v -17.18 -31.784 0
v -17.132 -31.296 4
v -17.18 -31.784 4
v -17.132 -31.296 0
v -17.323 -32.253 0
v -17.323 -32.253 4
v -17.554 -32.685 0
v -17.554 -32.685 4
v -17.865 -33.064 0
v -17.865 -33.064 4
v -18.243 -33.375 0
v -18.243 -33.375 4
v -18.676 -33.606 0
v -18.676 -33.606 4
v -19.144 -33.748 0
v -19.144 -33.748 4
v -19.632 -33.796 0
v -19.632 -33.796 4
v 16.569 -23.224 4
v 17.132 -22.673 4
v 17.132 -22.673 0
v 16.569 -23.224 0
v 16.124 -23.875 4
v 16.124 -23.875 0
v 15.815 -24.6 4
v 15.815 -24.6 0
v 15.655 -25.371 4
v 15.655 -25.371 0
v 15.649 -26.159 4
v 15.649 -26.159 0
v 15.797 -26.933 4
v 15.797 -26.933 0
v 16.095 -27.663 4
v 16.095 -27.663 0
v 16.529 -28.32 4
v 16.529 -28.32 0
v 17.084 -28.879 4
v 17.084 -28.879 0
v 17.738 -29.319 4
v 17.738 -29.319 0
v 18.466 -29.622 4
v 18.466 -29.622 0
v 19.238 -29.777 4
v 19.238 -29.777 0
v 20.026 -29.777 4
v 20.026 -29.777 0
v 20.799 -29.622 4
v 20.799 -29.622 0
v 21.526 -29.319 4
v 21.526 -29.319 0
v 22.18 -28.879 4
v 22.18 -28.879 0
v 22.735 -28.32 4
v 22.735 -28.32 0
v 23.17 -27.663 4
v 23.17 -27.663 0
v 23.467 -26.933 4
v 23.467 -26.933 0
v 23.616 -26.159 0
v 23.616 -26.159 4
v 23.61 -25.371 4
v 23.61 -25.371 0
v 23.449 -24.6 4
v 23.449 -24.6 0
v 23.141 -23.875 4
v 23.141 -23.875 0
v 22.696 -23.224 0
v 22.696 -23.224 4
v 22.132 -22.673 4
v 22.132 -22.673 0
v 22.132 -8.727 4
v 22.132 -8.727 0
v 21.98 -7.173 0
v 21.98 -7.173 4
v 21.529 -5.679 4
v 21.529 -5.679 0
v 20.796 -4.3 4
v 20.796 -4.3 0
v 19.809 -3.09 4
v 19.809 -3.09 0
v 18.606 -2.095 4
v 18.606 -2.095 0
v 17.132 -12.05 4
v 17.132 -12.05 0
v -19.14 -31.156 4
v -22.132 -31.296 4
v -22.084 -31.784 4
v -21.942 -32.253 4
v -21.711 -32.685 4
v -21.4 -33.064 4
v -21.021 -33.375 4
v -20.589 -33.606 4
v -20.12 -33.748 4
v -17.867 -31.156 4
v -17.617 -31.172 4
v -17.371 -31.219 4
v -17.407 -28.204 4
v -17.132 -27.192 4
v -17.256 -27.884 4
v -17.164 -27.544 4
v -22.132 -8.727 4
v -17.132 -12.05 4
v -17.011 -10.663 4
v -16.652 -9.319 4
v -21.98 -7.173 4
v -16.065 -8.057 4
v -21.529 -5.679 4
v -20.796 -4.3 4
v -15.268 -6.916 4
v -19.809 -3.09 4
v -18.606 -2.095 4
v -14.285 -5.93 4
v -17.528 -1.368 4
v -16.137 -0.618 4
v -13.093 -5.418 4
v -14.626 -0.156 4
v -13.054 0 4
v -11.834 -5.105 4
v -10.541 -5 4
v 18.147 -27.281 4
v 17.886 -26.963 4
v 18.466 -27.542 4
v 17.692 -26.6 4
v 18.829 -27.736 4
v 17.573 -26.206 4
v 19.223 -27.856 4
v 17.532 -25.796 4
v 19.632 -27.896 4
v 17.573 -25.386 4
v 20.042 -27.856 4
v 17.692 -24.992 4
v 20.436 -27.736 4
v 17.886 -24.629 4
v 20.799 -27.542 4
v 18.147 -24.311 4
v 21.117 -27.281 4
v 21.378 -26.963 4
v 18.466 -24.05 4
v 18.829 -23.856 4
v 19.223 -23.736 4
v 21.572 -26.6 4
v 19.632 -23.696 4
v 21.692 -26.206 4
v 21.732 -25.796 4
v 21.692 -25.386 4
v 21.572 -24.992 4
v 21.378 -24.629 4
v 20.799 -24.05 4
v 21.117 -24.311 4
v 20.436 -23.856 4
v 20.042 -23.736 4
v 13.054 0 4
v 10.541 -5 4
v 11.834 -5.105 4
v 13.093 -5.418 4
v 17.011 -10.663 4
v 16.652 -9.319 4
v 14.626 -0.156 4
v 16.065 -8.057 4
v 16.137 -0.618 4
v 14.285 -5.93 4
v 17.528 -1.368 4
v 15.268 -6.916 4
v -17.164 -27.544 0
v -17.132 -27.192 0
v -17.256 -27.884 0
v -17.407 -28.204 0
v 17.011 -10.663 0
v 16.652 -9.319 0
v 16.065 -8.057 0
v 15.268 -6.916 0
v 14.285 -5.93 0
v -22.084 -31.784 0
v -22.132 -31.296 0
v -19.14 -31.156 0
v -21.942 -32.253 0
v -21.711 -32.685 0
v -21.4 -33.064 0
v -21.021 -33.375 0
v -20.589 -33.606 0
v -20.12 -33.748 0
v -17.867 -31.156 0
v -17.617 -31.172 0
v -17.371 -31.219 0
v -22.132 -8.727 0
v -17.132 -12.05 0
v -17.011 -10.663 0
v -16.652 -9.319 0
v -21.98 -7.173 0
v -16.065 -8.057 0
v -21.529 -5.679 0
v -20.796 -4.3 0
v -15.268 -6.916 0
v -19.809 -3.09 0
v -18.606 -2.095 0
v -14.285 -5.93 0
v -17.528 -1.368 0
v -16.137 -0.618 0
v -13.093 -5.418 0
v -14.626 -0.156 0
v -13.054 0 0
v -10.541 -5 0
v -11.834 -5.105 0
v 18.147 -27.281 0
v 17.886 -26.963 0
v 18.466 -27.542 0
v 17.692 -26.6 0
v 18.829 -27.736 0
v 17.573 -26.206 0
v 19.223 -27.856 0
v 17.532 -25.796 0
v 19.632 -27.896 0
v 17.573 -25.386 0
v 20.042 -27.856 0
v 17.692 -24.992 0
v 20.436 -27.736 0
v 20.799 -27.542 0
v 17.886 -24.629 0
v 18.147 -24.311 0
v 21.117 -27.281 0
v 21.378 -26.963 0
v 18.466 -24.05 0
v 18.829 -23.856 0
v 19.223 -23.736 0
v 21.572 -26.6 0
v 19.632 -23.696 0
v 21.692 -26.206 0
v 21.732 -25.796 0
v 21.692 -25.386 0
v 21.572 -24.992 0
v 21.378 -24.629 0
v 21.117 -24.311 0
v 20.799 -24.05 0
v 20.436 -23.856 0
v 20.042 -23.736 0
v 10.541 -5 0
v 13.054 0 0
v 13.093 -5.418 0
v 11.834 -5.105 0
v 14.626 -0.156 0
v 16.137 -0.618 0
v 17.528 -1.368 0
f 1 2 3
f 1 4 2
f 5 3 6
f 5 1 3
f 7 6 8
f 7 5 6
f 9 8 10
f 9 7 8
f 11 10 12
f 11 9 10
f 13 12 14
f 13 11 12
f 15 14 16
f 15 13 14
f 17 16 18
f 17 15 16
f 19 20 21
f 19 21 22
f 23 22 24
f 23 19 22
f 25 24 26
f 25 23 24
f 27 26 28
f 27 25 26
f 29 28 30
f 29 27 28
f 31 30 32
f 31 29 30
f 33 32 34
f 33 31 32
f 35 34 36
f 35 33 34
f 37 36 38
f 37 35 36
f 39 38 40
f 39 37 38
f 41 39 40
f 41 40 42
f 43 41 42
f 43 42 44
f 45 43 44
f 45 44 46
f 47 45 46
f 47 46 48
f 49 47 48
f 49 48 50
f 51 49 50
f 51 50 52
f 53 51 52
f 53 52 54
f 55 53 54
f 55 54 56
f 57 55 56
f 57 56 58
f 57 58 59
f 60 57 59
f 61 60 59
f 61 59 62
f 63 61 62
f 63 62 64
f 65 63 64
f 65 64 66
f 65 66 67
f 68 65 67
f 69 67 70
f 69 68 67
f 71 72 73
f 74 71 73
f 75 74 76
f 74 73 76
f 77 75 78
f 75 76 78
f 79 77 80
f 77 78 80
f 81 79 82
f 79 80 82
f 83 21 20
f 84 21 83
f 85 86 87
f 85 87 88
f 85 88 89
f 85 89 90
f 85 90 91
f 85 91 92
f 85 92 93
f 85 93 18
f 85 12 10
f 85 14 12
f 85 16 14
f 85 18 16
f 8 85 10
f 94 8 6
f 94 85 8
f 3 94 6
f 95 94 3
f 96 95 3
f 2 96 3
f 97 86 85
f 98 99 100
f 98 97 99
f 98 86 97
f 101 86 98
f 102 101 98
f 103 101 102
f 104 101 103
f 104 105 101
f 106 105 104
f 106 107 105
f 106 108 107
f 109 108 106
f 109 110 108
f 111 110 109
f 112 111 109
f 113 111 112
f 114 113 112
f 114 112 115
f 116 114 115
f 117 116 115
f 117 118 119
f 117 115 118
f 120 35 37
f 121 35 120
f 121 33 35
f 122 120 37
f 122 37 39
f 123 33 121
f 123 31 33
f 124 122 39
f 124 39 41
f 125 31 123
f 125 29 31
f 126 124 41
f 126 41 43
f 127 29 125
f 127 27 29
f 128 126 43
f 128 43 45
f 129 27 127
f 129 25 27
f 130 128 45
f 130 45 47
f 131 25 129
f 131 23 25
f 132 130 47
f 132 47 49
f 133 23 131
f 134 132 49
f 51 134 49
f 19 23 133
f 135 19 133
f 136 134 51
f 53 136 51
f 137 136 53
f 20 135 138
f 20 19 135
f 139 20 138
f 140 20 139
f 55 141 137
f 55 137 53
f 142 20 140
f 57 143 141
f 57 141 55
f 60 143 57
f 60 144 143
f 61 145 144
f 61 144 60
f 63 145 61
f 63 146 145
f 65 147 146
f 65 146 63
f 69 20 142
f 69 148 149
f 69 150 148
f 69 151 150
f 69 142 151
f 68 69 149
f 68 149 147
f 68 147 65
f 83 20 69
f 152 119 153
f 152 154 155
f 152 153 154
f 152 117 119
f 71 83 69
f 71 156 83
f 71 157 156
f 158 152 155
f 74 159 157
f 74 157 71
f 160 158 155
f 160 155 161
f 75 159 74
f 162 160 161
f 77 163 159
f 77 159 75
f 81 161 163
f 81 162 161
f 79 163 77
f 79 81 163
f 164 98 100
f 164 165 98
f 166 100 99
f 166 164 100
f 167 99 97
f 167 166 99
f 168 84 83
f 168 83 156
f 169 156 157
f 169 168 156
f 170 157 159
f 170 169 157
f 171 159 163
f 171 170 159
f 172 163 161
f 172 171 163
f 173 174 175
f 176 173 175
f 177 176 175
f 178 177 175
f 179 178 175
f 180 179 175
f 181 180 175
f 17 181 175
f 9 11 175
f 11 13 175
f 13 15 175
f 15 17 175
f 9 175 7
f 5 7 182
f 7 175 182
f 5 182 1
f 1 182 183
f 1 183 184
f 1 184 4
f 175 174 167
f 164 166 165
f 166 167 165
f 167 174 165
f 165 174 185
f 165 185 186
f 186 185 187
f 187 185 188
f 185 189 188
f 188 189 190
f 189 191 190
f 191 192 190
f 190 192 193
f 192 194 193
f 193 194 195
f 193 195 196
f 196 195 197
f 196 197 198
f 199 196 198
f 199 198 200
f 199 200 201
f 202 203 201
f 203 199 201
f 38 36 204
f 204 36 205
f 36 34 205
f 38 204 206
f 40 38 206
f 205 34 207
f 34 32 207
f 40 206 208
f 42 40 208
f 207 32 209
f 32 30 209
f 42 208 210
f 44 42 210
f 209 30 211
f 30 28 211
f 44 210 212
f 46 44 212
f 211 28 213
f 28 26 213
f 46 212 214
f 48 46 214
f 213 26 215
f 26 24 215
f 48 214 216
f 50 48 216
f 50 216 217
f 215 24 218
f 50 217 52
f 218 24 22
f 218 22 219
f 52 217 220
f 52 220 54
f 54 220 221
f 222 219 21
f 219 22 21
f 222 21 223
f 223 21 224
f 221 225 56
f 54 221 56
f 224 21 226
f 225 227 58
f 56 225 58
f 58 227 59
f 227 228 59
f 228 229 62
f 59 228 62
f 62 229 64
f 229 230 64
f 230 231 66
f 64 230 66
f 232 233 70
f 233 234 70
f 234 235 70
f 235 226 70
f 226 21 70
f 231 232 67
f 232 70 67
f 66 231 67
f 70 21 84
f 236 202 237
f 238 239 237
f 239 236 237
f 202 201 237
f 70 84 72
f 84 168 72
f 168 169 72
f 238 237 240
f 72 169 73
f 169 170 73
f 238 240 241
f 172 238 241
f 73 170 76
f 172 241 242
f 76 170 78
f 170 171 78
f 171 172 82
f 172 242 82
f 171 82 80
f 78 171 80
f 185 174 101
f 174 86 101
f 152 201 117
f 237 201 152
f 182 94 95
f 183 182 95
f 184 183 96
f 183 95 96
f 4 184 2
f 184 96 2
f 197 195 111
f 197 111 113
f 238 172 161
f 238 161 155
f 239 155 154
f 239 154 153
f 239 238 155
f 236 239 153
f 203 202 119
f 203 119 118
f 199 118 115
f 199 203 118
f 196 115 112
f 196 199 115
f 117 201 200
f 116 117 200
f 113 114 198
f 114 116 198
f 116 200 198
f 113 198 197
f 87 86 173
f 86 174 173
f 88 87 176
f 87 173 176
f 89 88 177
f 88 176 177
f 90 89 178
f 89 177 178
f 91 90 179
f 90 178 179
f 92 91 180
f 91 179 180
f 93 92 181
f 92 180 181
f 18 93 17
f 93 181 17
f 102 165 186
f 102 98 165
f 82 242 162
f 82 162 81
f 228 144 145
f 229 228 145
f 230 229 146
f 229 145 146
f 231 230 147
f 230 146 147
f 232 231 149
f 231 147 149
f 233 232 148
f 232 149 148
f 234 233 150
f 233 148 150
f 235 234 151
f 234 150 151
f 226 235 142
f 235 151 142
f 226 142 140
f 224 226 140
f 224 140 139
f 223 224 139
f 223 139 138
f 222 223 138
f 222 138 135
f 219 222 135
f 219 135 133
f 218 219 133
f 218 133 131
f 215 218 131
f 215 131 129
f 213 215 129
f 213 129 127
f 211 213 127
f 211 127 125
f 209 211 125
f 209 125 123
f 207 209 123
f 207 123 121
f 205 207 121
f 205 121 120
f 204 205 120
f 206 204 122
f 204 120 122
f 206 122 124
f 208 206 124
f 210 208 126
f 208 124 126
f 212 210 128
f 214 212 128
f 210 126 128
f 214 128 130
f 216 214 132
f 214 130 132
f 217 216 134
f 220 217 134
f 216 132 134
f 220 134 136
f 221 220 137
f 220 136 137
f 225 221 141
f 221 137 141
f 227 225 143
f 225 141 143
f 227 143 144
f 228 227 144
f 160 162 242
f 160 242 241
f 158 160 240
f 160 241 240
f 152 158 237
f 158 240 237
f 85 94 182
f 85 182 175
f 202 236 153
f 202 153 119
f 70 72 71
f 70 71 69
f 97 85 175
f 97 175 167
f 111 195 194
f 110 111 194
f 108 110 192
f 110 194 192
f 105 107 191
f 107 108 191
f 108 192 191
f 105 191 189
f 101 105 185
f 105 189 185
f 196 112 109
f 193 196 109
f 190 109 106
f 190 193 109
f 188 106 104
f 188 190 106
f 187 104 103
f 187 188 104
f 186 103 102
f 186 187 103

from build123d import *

# Parameters (mm, degrees)
SALIENTE_EXTRUIR4_DEPTH = 4
REDONDEO1_R             = 8
CROQUIS4_R              = 4
SALIENTE_EXTRUIR5_DEPTH = 4
CROQUIS5_R              = 2.1
CORTAR_EXTRUIR1_DEPTH   = 10
CROQUIS6_W              = 5
CROQUIS6_H              = 11
SALIENTE_EXTRUIR6_DEPTH = 4
REDONDEO2_R             = 2.5
CORTAR_EXTRUIR3_DEPTH   = 10
REDONDEO5_R             = 2
REDONDEO6_R             = 2


# Some blends are built 0.0001 mm under size
with BuildPart() as part:
    # Croquis3 → Saliente-Extruir4 (new body)
    with BuildSketch(Plane.XY):
        Polygon((-15.5, 0), (15.5, 0), (22.13230058, -4.473543228), (22.13230058, -22.795964517), (17.13230058, -22.795964517), (17.13230058, -7.795964517), (12.987112718, -5), (-12.987112718, -5), (-17.13230058, -7.795964517), (-17.13230058, -22.795964517), (-22.13230058, -22.795964517), (-22.13230058, -4.473543228), align=None)
    extrude(amount=SALIENTE_EXTRUIR4_DEPTH)

    # Redondeo1
    # the kernel refuses this fillet: 8 mm, written as the material it adds along each edge
    with BuildSketch(Plane(origin=(-12.987112718, -5, 0), x_dir=(1, 0, 0), z_dir=(0, 0, 1)), Plane(origin=(12.987112718, -5, 0), x_dir=(0.8290375725550433, -0.5591929034707446, 0), z_dir=(0, 0, 1))) as redondeo1_piece_1:
        with BuildLine():
            CenterArc((REDONDEO1_R * 0.305730681459, -REDONDEO1_R), REDONDEO1_R, 90, 34)
            Line((-REDONDEO1_R * 0.253462222012, -REDONDEO1_R * 0.170962427445), (0, 0))
            Line((0, 0), (REDONDEO1_R * 0.305730681459, 0))
        make_face()
    extrude(amount=4)
    with BuildSketch(Plane(origin=(-17.13230058, -7.795964517, 0), x_dir=(0.8290375725550426, 0.5591929034707452, 0), z_dir=(0, 0, 1)), Plane(origin=(17.13230058, -7.795964517, 0), x_dir=(0, -1, 0), z_dir=(0, 0, 1))) as redondeo1_piece_2:
        with BuildLine():
            CenterArc((REDONDEO1_R * 0.531709431661, -REDONDEO1_R), REDONDEO1_R, 90, 56)
            Line((-REDONDEO1_R * 0.297328140894, -REDONDEO1_R * 0.440807096529), (0, 0))
            Line((0, 0), (REDONDEO1_R * 0.531709431661, 0))
        make_face()
    extrude(amount=4)
    # the kernel refuses this fillet: 8 mm, written as the material it takes off along each edge
    with BuildSketch(Plane(origin=(22.13230058, -4.473543228, -10.634188633), x_dir=(-0.8290375725550431, 0.5591929034707448, 0), z_dir=(0, 0, 1))) as redondeo1_2_piece_1:
        with BuildLine():
            CenterArc((REDONDEO1_R * 0.531709431661, REDONDEO1_R), REDONDEO1_R, 214, 56)
            Line((-REDONDEO1_R * 0.297328140894, REDONDEO1_R * 0.440807096529), (0, 0))
            Line((0, 0), (REDONDEO1_R * 0.531709431661, 0))
        make_face()
    extrude(amount=25.268377266, mode=Mode.SUBTRACT)
    with BuildSketch(Plane(origin=(15.5, 0, -6.114613629), x_dir=(-1, 0, 0), z_dir=(0, 0, 1))) as redondeo1_2_piece_2:
        with BuildLine():
            CenterArc((REDONDEO1_R * 0.305730681459, REDONDEO1_R), REDONDEO1_R, 236, 34)
            Line((-REDONDEO1_R * 0.253462222012, REDONDEO1_R * 0.170962427445), (0, 0))
            Line((0, 0), (REDONDEO1_R * 0.305730681459, 0))
        make_face()
    extrude(amount=16.229227258, mode=Mode.SUBTRACT)
    with BuildSketch(Plane(origin=(-15.5, 0, -6.114613629), x_dir=(1, 0, 0), z_dir=(0, 0, 1))) as redondeo1_2_piece_3:
        with BuildLine():
            CenterArc((REDONDEO1_R * 0.305730681459, -REDONDEO1_R), REDONDEO1_R, 90, 34)
            Line((-REDONDEO1_R * 0.253462222012, -REDONDEO1_R * 0.170962427445), (0, 0))
            Line((0, 0), (REDONDEO1_R * 0.305730681459, 0))
        make_face()
    extrude(amount=16.229227258, mode=Mode.SUBTRACT)
    with BuildSketch(Plane(origin=(-22.13230058, -4.473543228, -10.634188633), x_dir=(0.8290375725550428, 0.5591929034707449, 0), z_dir=(0, 0, 1))) as redondeo1_2_piece_4:
        with BuildLine():
            CenterArc((REDONDEO1_R * 0.531709431661, -REDONDEO1_R), REDONDEO1_R, 90, 56)
            Line((-REDONDEO1_R * 0.297328140894, -REDONDEO1_R * 0.440807096529), (0, 0))
            Line((0, 0), (REDONDEO1_R * 0.531709431661, 0))
        make_face()
    extrude(amount=25.268377266, mode=Mode.SUBTRACT)

    # Croquis4 → Saliente-Extruir5 (add, through all)
    with BuildSketch(Plane.XY.offset(4)):
        with Locations((19.63230058, -25.795964517)):
            Circle(CROQUIS4_R)
    extrude(amount=-SALIENTE_EXTRUIR5_DEPTH)

    # Croquis5 → Cortar-Extruir1 (cut)
    with BuildSketch(Plane.XY.offset(4)):
        with Locations((19.63230058, -25.795964517)):
            Circle(CROQUIS5_R)
    extrude(amount=-CORTAR_EXTRUIR1_DEPTH, mode=Mode.SUBTRACT)

    # Croquis6 → Saliente-Extruir6 (add, through all)
    with BuildSketch(Plane.XY.offset(4)):
        with Locations((-19.63230058, -28.295964517)):
            Rectangle(CROQUIS6_W, CROQUIS6_H)
    extrude(amount=-SALIENTE_EXTRUIR6_DEPTH)

    # Redondeo2
    redondeo2_edges = [part.edges().sort_by_distance(p)[0] for p in [
        (-17.13230058, -33.795964517, 2),
        (-22.13230058, -33.795964517, 2),
    ]]
    fillet(redondeo2_edges, radius=REDONDEO2_R - 0.0001)  # a hair under: the kernel refuses the full size

    # Croquis8 → Cortar-Extruir3 (cut)
    with BuildSketch(Plane.XY.offset(4)):
        Polygon((-17.13230058, -31.156317686), (-19.139649056, -31.156317686), (-17.13230058, -27.735081186), align=None)
    extrude(amount=-CORTAR_EXTRUIR3_DEPTH, mode=Mode.SUBTRACT)

    # Redondeo5
    redondeo5_edges = [part.edges().sort_by_distance(p)[0] for p in [
        (-17.13230058, -27.735081186, 2),
    ]]
    fillet(redondeo5_edges, radius=REDONDEO5_R)

    # Redondeo6
    # the kernel refuses this fillet: 2 mm, written as the material it takes off along each edge
    with BuildSketch(Plane(origin=(-17.13230058, -31.156317686, 5.83619537), x_dir=(-1, 0, 0), z_dir=(0, 0, -1))) as redondeo6_piece_1:
        with BuildLine():
            CenterArc((0.734478148, -2), REDONDEO6_R, 90, 21.545444272)
            Line((0, -0.139746832), (-0.014689563, -0.102541768))
            ThreePointArc((-0.014689563, -0.102541768), (-0.04, -0.069873416), (-0.04, 0))
            Line((-0.04, 0), (0, 0.04))
            Line((0, 0.04), (0.734478148, 0.04))
            Line((0.734478148, 0.04), (0.734478148, 0))
        make_face()
    extrude(amount=7.672390741, mode=Mode.SUBTRACT)


solid = part.part
